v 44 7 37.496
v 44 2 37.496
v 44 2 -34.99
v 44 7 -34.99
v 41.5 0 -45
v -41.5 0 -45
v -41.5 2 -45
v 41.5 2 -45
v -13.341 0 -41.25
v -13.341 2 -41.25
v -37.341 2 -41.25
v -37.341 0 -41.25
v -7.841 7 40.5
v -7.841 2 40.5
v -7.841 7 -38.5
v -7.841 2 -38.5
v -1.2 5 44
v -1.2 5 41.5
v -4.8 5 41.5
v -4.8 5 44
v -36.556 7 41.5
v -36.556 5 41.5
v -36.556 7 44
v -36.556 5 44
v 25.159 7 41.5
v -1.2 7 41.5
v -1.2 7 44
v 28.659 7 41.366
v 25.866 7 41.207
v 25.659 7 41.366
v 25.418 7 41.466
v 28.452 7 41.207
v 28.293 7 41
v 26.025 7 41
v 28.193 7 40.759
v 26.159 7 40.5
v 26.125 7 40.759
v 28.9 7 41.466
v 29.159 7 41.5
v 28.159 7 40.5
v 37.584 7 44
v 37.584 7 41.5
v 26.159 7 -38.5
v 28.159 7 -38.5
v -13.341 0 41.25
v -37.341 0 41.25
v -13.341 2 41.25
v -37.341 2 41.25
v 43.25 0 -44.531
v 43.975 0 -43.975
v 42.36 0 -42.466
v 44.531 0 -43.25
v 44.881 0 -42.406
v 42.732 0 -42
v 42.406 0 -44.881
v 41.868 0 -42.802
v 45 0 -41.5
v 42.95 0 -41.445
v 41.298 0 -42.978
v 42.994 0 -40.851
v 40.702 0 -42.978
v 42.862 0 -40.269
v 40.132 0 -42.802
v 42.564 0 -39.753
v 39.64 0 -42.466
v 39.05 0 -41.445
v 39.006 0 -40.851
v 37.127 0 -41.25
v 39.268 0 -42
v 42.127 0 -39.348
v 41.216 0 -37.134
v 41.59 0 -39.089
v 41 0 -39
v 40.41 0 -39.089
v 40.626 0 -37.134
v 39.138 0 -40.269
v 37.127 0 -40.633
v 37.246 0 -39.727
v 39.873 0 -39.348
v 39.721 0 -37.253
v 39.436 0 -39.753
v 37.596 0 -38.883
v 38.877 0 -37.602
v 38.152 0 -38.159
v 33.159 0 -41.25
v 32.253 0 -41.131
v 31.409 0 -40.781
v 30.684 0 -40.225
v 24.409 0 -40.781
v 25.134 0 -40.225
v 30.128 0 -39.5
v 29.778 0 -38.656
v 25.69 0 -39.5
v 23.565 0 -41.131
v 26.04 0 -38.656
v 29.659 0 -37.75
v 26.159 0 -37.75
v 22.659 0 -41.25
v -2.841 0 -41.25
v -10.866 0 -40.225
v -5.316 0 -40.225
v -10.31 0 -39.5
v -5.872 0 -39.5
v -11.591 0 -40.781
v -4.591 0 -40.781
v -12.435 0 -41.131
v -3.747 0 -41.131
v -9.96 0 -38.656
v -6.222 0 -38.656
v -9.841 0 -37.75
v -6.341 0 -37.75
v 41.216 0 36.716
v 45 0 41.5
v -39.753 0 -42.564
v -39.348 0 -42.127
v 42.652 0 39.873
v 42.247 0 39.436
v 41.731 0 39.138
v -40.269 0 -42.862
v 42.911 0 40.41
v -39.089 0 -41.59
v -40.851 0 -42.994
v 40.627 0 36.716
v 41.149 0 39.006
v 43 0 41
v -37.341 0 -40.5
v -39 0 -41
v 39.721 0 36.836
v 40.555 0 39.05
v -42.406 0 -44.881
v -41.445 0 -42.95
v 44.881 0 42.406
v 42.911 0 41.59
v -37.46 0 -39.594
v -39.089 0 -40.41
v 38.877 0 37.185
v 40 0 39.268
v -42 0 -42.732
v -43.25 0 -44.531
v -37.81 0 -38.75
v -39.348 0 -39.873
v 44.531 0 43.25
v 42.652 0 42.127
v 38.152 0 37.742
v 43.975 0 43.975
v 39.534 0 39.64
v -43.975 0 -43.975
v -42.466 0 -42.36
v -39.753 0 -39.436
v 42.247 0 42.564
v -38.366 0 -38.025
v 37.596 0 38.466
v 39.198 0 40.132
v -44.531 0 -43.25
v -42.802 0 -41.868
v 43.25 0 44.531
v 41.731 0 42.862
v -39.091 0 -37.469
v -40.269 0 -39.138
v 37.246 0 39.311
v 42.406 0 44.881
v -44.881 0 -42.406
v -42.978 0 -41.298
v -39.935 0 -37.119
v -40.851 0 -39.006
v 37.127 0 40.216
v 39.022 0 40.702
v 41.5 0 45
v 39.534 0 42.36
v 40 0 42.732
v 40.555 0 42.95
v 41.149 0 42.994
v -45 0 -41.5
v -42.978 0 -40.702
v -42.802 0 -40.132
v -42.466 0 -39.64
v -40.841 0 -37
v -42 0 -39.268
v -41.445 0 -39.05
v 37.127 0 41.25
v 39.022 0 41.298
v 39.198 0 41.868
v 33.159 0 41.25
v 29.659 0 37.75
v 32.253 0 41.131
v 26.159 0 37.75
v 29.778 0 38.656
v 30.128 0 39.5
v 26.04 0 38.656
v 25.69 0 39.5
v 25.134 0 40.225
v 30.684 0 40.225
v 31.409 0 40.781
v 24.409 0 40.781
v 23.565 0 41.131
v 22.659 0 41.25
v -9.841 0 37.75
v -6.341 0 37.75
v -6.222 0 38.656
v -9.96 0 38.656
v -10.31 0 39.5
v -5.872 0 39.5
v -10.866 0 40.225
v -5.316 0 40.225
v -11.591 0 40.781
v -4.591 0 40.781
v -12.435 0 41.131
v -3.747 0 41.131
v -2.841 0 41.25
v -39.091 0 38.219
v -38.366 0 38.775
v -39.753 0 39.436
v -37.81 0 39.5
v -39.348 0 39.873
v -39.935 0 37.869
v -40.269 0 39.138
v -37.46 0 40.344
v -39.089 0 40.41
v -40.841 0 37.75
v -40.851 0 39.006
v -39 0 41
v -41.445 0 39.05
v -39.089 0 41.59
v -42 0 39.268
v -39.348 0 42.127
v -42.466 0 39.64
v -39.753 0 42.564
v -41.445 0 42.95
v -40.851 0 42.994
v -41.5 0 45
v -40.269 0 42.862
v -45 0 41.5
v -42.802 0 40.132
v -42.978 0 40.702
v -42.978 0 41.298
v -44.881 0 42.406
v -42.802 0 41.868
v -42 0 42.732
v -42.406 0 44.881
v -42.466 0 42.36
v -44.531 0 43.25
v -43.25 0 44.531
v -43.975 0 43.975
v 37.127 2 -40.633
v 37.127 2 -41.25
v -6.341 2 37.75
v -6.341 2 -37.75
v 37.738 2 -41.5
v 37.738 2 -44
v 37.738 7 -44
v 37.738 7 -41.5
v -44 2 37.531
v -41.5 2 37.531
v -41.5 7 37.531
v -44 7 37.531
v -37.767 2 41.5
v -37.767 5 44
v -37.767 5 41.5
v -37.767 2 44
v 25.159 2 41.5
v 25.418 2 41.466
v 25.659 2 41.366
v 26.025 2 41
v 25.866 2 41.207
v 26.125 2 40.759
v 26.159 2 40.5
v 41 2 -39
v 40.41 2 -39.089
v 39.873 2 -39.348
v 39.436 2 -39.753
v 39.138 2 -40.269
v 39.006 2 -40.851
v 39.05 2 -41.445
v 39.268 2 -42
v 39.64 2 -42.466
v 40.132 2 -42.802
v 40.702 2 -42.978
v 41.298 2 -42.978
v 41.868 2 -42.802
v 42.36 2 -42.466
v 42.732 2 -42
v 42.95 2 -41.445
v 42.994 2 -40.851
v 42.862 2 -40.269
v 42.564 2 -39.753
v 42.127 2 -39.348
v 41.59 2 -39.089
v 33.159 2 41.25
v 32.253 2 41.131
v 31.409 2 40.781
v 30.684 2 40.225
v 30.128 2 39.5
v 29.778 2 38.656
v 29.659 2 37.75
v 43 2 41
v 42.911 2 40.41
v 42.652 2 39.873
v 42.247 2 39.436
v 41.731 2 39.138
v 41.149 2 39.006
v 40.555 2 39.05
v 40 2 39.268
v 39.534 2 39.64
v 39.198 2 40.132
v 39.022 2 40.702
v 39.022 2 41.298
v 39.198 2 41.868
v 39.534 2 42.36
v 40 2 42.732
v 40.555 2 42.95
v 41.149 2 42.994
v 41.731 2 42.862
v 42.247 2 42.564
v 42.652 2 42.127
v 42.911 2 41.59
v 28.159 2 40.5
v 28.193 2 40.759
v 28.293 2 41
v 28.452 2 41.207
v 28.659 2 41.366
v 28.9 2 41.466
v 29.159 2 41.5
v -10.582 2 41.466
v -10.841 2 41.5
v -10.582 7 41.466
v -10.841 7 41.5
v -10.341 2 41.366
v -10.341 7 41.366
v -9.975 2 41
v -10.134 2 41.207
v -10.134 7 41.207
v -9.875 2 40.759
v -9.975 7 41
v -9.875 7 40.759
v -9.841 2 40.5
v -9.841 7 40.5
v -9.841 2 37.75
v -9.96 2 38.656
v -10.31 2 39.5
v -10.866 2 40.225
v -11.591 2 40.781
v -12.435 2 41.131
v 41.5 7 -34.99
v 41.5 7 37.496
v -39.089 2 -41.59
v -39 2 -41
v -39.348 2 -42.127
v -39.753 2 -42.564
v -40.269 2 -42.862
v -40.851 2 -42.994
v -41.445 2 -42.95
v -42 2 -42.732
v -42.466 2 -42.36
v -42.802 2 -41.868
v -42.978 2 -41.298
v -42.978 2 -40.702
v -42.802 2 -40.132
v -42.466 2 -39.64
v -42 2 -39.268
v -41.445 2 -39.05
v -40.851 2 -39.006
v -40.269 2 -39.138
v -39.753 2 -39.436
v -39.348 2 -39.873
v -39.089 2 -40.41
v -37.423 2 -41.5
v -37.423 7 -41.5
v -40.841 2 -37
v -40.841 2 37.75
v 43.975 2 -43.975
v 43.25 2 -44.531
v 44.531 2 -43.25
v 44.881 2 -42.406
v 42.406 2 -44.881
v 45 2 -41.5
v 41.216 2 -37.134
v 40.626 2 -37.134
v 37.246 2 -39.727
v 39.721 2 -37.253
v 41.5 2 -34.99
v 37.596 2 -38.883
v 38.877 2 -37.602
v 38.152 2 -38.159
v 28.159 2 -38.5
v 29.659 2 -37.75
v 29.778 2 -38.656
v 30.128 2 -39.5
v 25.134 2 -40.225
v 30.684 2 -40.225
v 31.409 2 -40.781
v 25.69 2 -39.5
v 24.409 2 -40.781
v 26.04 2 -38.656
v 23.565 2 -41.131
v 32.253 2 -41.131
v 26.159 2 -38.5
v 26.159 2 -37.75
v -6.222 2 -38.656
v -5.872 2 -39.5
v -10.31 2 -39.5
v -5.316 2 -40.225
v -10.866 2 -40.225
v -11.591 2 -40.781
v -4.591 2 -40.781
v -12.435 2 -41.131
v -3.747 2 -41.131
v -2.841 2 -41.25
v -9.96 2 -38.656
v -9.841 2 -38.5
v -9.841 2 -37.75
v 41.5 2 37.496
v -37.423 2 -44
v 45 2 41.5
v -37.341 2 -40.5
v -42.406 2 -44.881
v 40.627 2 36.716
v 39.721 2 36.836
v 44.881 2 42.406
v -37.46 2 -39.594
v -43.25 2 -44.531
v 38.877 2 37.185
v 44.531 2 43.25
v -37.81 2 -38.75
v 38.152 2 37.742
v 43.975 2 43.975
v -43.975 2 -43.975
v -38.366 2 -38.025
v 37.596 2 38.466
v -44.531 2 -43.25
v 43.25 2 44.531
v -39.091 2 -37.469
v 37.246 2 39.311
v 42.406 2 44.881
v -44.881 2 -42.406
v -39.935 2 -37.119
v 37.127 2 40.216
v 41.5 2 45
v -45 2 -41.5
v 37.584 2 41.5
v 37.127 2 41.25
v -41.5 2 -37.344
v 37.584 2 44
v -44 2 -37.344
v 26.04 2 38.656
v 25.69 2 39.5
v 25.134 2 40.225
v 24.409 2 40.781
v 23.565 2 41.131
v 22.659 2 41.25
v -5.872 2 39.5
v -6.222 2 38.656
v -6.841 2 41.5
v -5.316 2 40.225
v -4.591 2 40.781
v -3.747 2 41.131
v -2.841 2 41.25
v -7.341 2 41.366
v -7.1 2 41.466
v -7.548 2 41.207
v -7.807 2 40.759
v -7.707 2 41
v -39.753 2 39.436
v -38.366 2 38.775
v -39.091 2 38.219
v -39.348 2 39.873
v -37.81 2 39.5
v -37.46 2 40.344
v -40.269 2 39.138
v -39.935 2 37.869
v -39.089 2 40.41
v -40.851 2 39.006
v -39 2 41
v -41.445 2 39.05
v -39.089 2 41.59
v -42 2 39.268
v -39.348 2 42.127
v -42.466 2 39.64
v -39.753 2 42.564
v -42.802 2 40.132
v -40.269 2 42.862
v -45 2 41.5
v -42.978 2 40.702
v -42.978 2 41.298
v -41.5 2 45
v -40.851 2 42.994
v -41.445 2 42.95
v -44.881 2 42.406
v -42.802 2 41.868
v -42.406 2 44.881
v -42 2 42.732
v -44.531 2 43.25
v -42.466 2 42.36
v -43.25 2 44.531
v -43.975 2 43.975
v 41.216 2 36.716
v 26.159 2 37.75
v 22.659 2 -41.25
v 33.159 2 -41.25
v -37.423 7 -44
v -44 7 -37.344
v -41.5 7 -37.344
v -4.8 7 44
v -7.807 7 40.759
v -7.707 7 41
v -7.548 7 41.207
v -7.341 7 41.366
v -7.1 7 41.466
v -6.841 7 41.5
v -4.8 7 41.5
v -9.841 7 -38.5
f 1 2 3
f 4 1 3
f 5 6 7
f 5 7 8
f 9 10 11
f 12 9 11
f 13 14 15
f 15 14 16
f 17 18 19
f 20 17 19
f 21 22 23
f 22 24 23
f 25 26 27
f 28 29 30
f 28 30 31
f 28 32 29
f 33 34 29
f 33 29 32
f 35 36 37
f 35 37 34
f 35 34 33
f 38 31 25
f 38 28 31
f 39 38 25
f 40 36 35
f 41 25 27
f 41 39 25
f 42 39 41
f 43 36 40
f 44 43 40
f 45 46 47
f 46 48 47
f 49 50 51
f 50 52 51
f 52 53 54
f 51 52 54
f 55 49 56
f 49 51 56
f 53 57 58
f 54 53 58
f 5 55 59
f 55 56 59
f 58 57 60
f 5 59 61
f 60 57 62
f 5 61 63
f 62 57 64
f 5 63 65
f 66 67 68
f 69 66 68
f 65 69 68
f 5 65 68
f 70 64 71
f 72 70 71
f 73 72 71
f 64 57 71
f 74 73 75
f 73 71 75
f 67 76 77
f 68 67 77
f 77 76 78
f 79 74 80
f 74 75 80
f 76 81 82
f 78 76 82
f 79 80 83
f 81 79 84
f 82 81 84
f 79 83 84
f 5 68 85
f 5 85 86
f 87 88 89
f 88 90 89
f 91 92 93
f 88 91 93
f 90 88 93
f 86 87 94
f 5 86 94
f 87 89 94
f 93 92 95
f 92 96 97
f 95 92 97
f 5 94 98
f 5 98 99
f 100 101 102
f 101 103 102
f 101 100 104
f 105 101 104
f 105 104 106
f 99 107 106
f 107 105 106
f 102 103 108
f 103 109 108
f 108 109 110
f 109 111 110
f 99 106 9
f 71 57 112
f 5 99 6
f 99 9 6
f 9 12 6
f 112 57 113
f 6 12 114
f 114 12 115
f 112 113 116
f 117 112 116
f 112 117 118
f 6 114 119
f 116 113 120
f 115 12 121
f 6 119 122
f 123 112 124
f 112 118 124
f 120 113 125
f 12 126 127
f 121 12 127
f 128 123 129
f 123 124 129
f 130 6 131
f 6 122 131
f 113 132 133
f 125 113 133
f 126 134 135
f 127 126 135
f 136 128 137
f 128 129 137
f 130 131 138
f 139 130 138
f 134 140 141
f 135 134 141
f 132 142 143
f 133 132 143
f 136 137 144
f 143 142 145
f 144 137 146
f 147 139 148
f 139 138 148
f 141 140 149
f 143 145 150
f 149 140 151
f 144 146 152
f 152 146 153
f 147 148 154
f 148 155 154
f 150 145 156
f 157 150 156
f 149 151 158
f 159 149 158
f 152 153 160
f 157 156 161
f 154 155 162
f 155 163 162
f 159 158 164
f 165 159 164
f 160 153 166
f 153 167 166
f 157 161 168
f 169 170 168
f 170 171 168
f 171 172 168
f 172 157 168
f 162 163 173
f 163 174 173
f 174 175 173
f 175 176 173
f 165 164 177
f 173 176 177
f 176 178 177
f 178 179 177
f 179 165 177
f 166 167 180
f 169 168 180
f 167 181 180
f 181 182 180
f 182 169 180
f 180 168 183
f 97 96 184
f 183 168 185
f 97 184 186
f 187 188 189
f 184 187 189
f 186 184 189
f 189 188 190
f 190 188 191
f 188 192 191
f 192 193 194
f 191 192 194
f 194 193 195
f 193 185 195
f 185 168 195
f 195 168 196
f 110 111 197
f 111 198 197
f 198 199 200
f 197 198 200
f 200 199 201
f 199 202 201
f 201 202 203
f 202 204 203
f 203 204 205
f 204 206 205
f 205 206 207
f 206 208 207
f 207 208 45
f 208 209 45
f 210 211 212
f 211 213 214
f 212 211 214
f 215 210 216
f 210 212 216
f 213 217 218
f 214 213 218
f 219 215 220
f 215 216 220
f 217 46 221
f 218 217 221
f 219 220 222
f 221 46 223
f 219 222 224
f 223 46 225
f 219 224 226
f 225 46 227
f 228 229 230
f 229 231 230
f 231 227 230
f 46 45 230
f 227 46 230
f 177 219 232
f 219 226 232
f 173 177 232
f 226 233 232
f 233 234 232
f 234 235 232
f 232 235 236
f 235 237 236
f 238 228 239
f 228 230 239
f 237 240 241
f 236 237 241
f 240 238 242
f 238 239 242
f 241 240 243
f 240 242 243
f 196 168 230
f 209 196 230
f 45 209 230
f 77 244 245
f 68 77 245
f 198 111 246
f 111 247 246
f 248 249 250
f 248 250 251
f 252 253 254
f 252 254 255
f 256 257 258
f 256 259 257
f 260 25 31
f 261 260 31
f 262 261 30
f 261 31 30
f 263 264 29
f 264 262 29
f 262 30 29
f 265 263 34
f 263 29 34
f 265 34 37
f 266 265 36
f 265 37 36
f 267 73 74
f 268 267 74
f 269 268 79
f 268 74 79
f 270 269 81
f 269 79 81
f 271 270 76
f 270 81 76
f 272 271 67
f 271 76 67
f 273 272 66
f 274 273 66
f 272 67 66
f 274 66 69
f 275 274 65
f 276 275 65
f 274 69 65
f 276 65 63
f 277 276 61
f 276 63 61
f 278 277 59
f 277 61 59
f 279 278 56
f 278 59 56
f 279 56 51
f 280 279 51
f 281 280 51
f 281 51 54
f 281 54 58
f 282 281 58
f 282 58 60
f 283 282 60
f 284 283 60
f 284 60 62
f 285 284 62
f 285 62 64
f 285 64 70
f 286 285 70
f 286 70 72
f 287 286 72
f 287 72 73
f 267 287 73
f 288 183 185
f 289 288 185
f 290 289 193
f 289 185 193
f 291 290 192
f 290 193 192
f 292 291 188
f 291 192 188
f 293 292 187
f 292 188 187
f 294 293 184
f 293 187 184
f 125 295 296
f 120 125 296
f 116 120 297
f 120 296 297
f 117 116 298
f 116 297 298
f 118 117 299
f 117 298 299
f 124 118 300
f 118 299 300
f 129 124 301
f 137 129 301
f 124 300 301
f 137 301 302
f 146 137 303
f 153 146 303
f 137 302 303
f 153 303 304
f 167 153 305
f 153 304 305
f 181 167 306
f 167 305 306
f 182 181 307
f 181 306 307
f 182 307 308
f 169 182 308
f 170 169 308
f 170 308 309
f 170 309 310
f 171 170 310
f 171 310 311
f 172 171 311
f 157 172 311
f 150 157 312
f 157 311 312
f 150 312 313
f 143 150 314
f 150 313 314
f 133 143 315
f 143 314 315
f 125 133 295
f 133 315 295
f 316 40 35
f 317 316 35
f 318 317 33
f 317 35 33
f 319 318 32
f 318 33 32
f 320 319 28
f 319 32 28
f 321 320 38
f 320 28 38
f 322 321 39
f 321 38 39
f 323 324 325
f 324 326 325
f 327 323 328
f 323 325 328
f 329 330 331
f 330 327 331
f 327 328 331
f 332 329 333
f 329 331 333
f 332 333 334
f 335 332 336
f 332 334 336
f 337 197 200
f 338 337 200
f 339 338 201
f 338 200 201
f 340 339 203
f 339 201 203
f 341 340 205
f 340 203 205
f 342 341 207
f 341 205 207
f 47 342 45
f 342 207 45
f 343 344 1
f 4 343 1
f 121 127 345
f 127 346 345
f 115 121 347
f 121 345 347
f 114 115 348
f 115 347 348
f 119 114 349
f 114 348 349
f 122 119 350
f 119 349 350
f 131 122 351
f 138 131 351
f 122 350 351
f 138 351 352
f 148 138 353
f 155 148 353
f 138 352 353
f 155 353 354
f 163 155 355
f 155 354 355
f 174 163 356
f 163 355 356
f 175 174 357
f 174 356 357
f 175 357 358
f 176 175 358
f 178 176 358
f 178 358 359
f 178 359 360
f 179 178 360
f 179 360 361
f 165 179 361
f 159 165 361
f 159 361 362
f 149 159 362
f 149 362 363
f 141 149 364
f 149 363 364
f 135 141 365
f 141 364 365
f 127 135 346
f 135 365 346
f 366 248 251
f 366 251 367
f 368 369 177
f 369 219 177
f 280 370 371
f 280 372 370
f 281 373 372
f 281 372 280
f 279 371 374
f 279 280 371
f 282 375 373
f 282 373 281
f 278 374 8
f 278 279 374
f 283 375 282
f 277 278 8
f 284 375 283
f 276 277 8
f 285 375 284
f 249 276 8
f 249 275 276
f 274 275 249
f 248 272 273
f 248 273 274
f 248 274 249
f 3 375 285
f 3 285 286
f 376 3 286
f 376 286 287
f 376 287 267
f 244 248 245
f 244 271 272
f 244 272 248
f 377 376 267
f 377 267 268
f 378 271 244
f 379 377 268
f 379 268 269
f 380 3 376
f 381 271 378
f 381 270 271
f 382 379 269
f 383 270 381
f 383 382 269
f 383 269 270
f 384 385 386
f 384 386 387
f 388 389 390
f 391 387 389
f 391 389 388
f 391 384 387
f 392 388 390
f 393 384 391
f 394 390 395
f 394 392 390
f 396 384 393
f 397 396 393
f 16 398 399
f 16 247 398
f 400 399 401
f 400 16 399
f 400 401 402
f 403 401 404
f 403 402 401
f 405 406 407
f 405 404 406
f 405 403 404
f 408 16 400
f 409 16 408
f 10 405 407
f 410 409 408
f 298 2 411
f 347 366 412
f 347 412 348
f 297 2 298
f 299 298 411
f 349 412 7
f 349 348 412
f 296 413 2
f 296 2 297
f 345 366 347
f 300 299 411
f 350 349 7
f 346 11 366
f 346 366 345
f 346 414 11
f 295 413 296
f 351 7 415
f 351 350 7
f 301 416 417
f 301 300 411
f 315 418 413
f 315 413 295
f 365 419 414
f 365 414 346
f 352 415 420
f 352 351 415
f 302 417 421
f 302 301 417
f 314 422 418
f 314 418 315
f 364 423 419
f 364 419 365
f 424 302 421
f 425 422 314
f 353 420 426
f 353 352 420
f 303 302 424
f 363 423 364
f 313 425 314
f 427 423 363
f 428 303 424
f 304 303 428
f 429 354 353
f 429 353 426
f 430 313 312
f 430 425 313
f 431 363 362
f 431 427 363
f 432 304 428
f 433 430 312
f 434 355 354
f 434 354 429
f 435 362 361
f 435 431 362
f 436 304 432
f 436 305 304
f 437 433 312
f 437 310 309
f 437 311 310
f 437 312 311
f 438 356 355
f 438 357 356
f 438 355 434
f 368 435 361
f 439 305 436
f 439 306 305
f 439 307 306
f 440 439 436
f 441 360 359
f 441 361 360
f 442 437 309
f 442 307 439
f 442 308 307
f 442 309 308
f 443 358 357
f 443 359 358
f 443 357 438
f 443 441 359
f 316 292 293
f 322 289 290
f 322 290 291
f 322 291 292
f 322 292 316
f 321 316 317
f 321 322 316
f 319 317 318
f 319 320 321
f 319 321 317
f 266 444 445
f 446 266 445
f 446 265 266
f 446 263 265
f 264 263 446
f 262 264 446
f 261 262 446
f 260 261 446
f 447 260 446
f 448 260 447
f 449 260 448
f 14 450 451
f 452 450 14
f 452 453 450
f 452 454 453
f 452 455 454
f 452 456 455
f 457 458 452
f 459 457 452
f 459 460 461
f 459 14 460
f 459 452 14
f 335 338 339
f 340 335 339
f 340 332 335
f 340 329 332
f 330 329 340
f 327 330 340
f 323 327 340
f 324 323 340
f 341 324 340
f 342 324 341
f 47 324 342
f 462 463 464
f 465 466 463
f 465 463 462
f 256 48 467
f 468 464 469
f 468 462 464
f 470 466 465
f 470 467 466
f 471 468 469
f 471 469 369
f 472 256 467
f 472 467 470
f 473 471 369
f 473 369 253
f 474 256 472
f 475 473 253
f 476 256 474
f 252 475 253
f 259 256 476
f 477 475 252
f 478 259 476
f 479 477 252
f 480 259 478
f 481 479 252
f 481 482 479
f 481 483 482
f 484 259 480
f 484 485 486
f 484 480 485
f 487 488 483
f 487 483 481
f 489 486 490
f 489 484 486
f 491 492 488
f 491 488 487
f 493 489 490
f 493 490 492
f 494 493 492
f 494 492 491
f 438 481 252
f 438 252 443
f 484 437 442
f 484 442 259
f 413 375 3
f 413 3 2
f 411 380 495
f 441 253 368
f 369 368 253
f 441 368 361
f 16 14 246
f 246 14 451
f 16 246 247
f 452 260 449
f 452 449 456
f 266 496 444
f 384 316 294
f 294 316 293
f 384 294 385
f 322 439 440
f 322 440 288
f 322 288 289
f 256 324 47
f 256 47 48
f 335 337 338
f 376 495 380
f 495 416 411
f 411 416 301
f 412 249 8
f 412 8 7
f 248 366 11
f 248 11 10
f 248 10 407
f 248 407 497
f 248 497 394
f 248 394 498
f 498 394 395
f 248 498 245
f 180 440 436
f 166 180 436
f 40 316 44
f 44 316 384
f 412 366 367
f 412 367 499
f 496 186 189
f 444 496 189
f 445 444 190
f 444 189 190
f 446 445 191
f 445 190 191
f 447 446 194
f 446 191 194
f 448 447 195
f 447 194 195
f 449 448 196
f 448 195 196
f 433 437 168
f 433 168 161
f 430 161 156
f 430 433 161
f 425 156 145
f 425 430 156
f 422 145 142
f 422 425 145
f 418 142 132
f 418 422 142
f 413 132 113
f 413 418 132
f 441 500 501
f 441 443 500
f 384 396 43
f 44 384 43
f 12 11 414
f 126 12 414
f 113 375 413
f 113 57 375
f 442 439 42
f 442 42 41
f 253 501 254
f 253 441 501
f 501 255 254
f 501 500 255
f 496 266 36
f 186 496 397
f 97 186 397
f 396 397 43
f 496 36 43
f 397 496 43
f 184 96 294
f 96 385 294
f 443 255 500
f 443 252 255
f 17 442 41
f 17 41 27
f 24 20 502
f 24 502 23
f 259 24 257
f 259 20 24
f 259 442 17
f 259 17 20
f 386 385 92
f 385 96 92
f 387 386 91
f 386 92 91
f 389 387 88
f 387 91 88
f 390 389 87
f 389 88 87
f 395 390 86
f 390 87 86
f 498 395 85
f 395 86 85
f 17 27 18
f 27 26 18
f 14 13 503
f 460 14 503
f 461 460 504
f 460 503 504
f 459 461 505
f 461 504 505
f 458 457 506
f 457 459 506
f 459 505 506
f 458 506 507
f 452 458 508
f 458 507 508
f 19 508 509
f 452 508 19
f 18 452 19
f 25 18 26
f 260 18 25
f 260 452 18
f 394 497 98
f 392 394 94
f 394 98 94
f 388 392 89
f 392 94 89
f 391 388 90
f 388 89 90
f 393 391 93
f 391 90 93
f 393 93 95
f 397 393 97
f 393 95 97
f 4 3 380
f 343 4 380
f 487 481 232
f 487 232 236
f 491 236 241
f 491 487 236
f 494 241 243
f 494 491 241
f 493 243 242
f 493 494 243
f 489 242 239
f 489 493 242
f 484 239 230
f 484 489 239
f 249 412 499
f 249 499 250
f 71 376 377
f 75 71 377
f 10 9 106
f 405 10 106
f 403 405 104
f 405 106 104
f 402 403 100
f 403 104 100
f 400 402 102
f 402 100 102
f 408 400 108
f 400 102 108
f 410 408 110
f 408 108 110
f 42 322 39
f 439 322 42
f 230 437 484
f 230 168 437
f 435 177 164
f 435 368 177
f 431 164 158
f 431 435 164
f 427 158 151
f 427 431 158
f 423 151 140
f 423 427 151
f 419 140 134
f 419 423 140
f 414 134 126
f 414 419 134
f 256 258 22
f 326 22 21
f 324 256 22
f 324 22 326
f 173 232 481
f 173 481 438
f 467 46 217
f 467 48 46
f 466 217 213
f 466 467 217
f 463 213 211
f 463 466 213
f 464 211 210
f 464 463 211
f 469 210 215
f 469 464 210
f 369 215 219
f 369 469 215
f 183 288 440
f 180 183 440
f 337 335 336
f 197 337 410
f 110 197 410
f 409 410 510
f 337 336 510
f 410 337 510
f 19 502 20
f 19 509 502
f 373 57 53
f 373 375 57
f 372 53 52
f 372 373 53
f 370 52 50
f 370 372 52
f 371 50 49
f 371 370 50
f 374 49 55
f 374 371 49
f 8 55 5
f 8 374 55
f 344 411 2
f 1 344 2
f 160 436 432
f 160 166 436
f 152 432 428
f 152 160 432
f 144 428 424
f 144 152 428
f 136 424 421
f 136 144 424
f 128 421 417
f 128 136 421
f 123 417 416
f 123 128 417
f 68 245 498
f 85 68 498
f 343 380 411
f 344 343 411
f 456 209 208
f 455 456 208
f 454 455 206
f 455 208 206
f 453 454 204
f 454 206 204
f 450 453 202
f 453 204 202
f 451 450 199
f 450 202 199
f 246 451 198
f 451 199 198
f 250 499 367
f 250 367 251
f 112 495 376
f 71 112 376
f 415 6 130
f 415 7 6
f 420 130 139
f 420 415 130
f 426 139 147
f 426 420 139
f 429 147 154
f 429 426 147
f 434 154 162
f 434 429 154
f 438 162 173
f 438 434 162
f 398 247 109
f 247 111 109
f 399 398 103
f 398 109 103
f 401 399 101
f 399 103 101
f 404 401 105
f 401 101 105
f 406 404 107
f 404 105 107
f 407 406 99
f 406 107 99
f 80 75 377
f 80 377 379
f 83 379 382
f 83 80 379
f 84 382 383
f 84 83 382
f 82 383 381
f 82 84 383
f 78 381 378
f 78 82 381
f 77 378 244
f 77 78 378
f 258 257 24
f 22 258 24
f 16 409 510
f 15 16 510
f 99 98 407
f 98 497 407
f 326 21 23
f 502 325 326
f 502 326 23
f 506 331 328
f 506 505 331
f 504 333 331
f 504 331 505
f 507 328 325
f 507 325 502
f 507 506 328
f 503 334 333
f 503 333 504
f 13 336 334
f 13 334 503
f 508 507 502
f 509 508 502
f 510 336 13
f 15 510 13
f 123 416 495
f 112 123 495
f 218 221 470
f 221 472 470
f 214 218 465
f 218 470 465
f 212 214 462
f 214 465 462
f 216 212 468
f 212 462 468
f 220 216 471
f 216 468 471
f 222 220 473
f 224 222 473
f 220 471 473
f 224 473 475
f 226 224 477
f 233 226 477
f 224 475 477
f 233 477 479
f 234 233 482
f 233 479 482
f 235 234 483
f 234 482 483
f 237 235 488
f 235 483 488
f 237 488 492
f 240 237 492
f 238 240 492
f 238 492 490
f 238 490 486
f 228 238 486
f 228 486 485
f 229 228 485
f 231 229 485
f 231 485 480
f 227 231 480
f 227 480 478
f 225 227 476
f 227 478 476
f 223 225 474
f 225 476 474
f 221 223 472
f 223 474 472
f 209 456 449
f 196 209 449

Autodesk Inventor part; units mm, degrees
ref_plane "YZ Plane" through (0, 0, 0) normal (1, 0, 0) x (0, 1, 0)
ref_plane "XZ Plane" through (0, 0, 0) normal (0, 1, 0) x (-1, 0, 0)
ref_plane "XY Plane" through (0, 0, 0) normal (0, 0, 1) x (1, 0, 0)
sketch "Sketch1" plane through (0, 0, 0) normal (0, 1, 0) x (-1, 0, 0)
  line L0 (45, -45) -> (-45, -45)
  line L1 (-45, -45) -> (-45, 45)
  line L2 (-45, 45) -> (45, 45)
  line L3 (45, 45) -> (45, -45)
  line L4 (45, -45) -> (-45, 45) construction
  line L5 (-45, -45) -> (45, 45) construction
  point P0 (0, 0)
  dimension "d2" = 90
  dimension "d3" = 90
extrude "Extrusion1" add sketch "Sketch1" along normal blind 2
sketch "Sketch2" plane through (0, 2, 0) normal (0, 1, 0) x (1, 0, 0)
  line L0 (45, -45) -> (45, 45) projected
  line L1 (45, 45) -> (41, 45)
  line L2 (45, 45) -> (-45, 45) projected
  circle A0 centre (41, 41) radius 2
  point P0 (0, 0)
hole "Hole1" at (41, 2, -41) direction (0, -1, 0) diameter 4 end through all
sketch "Sketch3" plane through (0, 2, 0) normal (0, 1, 0) x (1, 0, 0)
  circle A0 centre (-41, 41) radius 2
  line L0 (-45, 45) -> (-45, -45) projected
  circle A1 centre (-41, -41) radius 2
  line L1 (45, -45) -> (45, 45) projected
  circle A2 centre (41, -41) radius 2
  point P0 (0, 0)
  dimension "d17" = 4
  dimension "d21" = 4
extrude "Extrusion2" cut sketch "Sketch3" against normal blind 2
fillet "Fillet1" radius 3.5 4 edges at (-45, 1, -45) (45, 1, -45) (45, 1, 45) (-45, 1, 45)
sketch "Sketch5" plane through (0, 2, 0) normal (0, 1, 0) x (1, 0, 0)
  line L0 (40, 40) -> (-40, 40)
  line L1 (-40, 40) -> (-40, -40)
  line L2 (-40, -40) -> (40, -40)
  line L3 (40, -40) -> (40, 40)
  line L4 (40, 40) -> (-40, -40) construction
  line L5 (-40, 40) -> (40, -40) construction
  line L6 (-9.8412, 41.25) -> (-37.3412, 41.25)
  line L7 (-37.3412, 41.25) -> (-37.3412, -41.25)
  line L8 (-37.3412, -41.25) -> (-9.8412, -41.25)
  line L9 (-9.8412, -41.25) -> (-9.8412, 41.25)
  line L10 (-9.8412, 41.25) -> (-37.3412, -41.25) construction
  line L11 (-37.3412, 41.25) -> (-9.8412, -41.25) construction
  line L12 (26.1588, 41.25) -> (-6.3412, 41.25)
  line L13 (-6.3412, 41.25) -> (-6.3412, -41.25)
  line L14 (-6.3412, -41.25) -> (26.1588, -41.25)
  line L15 (26.1588, -41.25) -> (26.1588, 41.25)
  line L16 (26.1588, 41.25) -> (-6.3412, -41.25) construction
  line L17 (-6.3412, 41.25) -> (26.1588, -41.25) construction
  line L18 (37.1268, 41.25) -> (29.6588, 41.25)
  line L19 (29.6588, 41.25) -> (29.6588, -41.25)
  line L20 (29.6588, -41.25) -> (37.1268, -41.25)
  line L21 (37.1268, -41.25) -> (37.1268, 41.25)
  line L22 (37.1268, 41.25) -> (29.6588, -41.25) construction
  line L23 (29.6588, 41.25) -> (37.1268, -41.25) construction
  line L24 (-41.5049, 41.25) -> (-37.5049, 41.25)
  line L25 (41.2164, 37.1336) -> (36.7164, 37.1336)
  line L26 (36.7164, 37.1336) -> (36.7164, -36.7164)
  line L27 (36.7164, -36.7164) -> (41.2164, -36.7164)
  line L28 (41.2164, -36.7164) -> (41.2164, 37.1336)
  line L29 (41.2164, 37.1336) -> (36.7164, -36.7164) construction
  line L30 (36.7164, 37.1336) -> (41.2164, -36.7164) construction
  line L31 (37.1268, 41.25) -> (41.1268, 41.25)
  line L32 (41.1268, 41.25) -> (41.1268, 37.25)
  point P0 (0, 0)
  point P1 (-23.5912, 0)
  point P2 (9.9088, 0)
  point P3 (33.3928, 0)
  point P4 (38.9664, 0.2086)
  point P5 (37.1268, 37.1336)
  point P6 (37.1268, 40)
  point P7 (29.6588, 40)
  point P8 (29.6588, -40)
  point P9 (37.1268, -40)
  point P10 (37.1268, -36.7164)
  dimension "d25" = 80
  dimension "d26" = 80
  dimension "d27" = 27.5
  dimension "d28" = 82.5
  dimension "d29" = 32.5
  dimension "d30" = 82.5
  dimension "d31" = 7.468
  dimension "d32" = 82.5
  dimension "d33" = 4
  dimension "d34" = 3.5
  dimension "d35" = 3.5
  dimension "d36" = 4.5
  dimension "d37" = 4
  dimension "d38" = 4
  dimension "d39" = 73.85
extrude "Extrusion4" cut sketch "Sketch5" against normal through all contours L21 L25 L26 L27 L2 L19 L0 | L0 L19 L18 L21 | L25 L28 L27 L3 | L3 L27 L21 L25 | L21 L27 L26 L25 | L15 L2 L13 L0 | L0 L13 L12 L15 | L2 L21 L20 L19 | L15 L14 L13 L2 | L9 L2 L7 L0 | L0 L7 L6 L9 | L9 L8 L7 L2
sketch "Sketch8" plane through (0, 2, 0) normal (0, 1, 0) x (1, 0, 0)
  line L0 (-45, 41.5) -> (-45, -41.5) projected
  line L1 (-45, 41.5) -> (-44, 41.5)
  line L2 (41.5, 45) -> (-41.5, 45) projected
  line L3 (-41.5, 45) -> (-41.5, 44)
  line L4 (-45, -41.5) -> (-44, -41.5)
  arc A0 (-45, -41.5) -> (-41.5, -45) centre (-41.5, -41.5) ccw projected
  line L5 (-41.5, -45) -> (-41.5, -44)
  line L6 (41.5, -45) -> (41.5, -44)
  arc A1 (41.5, -45) -> (45, -41.5) centre (41.5, -41.5) ccw projected
  line L7 (45, -41.5) -> (44, -41.5)
  arc A2 (45, 41.5) -> (41.5, 45) centre (41.5, 41.5) ccw projected
  circle A3 centre (-41, -41) radius 2 projected
  line L8 (-41, -39) -> (-41, -38)
  line L9 (-39, -41) -> (-38, -41)
  circle A4 centre (-41, 41) radius 2 projected
  line L10 (-39, 41) -> (-38, 41)
  line L11 (-41, 39) -> (-41, 38)
  circle A5 centre (41, 41) radius 2 projected
  line L12 (37.1268, 41.25) -> (37.1268, 37.1336) projected
  circle A6 centre (41, -41) radius 2 projected
  line L13 (41, -39) -> (41, -38)
  line L14 (39, -41) -> (38, -41)
  line L15 (-44, 37.3438) -> (-41.5, 37.3438)
  line L16 (-41.5, 37.3438) -> (-41.5, -37.5309)
  line L17 (-41.5, -37.5309) -> (-44, -37.5309)
  line L18 (-44, -37.5309) -> (-44, 37.3438)
  line L19 (37.5845, -44) -> (-37.7671, -44)
  line L20 (-37.7671, -44) -> (-37.7671, -41.5)
  line L21 (-37.7671, -41.5) -> (37.5845, -41.5)
  line L22 (37.5845, -41.5) -> (37.5845, -44)
  line L23 (44, 34.9904) -> (41.5, 34.9904)
  line L24 (41.5, 34.9904) -> (41.5, -37.4955)
  line L25 (41.5, -37.4955) -> (44, -37.4955)
  line L26 (44, -37.4955) -> (44, 34.9904)
  line L27 (-37.4232, 44) -> (37.7379, 44)
  line L28 (37.7379, 44) -> (37.7379, 41.5)
  line L29 (37.7379, 41.5) -> (-37.4232, 41.5)
  line L30 (-37.4232, 41.5) -> (-37.4232, 44)
  line L31 (26.1588, -41.5) -> (28.1588, -41.5)
  line L32 (28.1588, -41.5) -> (28.1588, 41.5)
  line L33 (28.1588, 41.5) -> (26.1588, 41.5)
  line L34 (26.1588, 41.5) -> (26.1588, -41.5)
  line L35 (-9.8412, -41.5) -> (-7.8412, -41.5)
  line L36 (-7.8412, -41.5) -> (-7.8412, 41.5)
  line L37 (-7.8412, 41.5) -> (-9.8412, 41.5)
  line L38 (-9.8412, 41.5) -> (-9.8412, -41.5)
  point P0 (0, 0)
  dimension "d46" = 1
  dimension "d47" = 1
  dimension "d48" = 1
  dimension "d49" = 1
  dimension "d50" = 1
  dimension "d51" = 1
  dimension "d54" = 1
  dimension "d55" = 1
  dimension "d56" = 1
  dimension "d57" = 1
  dimension "d60" = 1
  dimension "d61" = 1
  dimension "d63" = 2.5
  dimension "d64" = 2.5
  dimension "d65" = 2.5
  dimension "d72" = 2
  dimension "d73" = 2
extrude "Extrusion5" add sketch "Sketch8" along normal blind 5 contours L15 L16 L17 L18 | L19 L20 L21 L22 | L21 L34 L29 L32 | L38 L29 L36 L21 | L29 L30 L27 L28 | L26 L25 L24 L23
fillet "Fillet3" radius 3.5 1 edges at (37.1268, 1, 36.7164)
fillet "Fillet4" radius 3.5 8 edges at (-6.3412, 1, 41.25) (-6.3412, 1, -41.25) (29.6588, 1, -41.25) (29.6588, 1, 41.25) (26.1588, 1, -41.25) (-9.8412, 1, -41.25) (26.1588, 1, 41.25) (-9.8412, 1, 41.25)
fillet "Fillet7" radius 1 4 edges at (-7.8412, 4.5, 41.5) (28.1588, 4.5, 41.5) (26.1588, 4.5, 41.5) (-9.8412, 4.5, 41.5)
sketch "Sketch10" plane through (0, 0, 0) normal (0, -1, 0) x (1, 0, 0)
  line L0 (-37.3412, -41.25) -> (-37.3412, 41.25) projected
  line L1 (-37.3412, 37.75) -> (-40.8412, 37.75)
  line L2 (-40.8412, 37.75) -> (-40.8412, -37)
  line L3 (-40.8412, -37) -> (-37.3412, -37)
  line L4 (-37.3412, -37) -> (-37.3412, 37.75)
  point P0 (0, 0)
  point P1 (-37.3412, -37.75)
  dimension "d78" = 3.5
extrude "Extrusion6" cut sketch "Sketch10" against normal through all
fillet "Fillet8" radius 3.5 1 edges at (-37.3412, 1, -37)
fillet "Fillet11" radius 3.5 2 edges at (37.1268, 1, -37.1336) (-37.3412, 1, 37.75)
sketch "Sketch19" plane through (-37.7671, 2, 44) normal (0, 0, 1) x (1, 0, 0)
  line L0 (75.3516, 0) -> (0, 0) projected
  line L1 (0, 5) -> (75.3516, 5) projected
  line L2 (0, 0) -> (0, 5) projected
  line L3 (0, 5) -> (0, 3)
  line L4 (0, 3) -> (1.2108, 3)
  line L5 (1.2108, 3) -> (1.2108, 5)
  line L6 (1.2108, 5) -> (0, 5)
  line L7 (0, 5) -> (0, 3)
  point P0 (37.7671, -2)
  dimension "d90" = 2
  dimension "d106" = 1.2108
extrude "Extrusion7" cut sketch "Sketch19" against normal blind 3
sketch "Sketch21" plane through (25.1588, 2, 41.5) normal (0, 0, -1) x (-1, 0, 0)
  line L0 (32, 0) -> (0, 0) projected
  line L1 (0, 5) -> (32, 5) projected
  line L2 (28.159, 5) -> (29.959, 5)
  line L3 (29.959, 5) -> (29.959, 4)
  line L4 (28.159, 5) -> (26.359, 5)
  line L5 (29.959, 5) -> (26.359, 5)
  line L6 (26.359, 5) -> (26.359, 3)
  line L7 (26.359, 3) -> (29.959, 3)
  line L8 (29.959, 3) -> (29.959, 5)
  point P0 (25.1588, -2)
  point P1 (29.959, 4)
  dimension "d102" = 1.8
  dimension "d103" = 1
  dimension "d104" = 1.8
  dimension "d105" = 2
extrude "Extrusion8" cut sketch "Sketch21" against normal up to surface (2.5 mm away)
sketch "Sketch22" plane through (-9.8412, 2, -41.5) normal (-1, 0, 0) x (0, 0, 1)
  line L0 (0, 5) -> (82, 5) projected
  line L1 (0, 5) -> (3, 5)
  line L2 (3.75, 0) -> (0, 0) projected
  line L3 (3, 5) -> (0, 5)
  line L4 (0, 5) -> (0, 0)
  line L5 (0, 0) -> (3, 0)
  line L6 (3, 0) -> (3, 5)
  point P0 (41.5, -2)
  point P1 (3, 0)
  dimension "d98" = 3
extrude "Extrusion9" cut sketch "Sketch22" against normal up to surface (38 mm away)
sketch "Sketch23" plane through (-37.7671, 2, 44) normal (0, 0, 1) x (1, 0, 0)
  line L0 (33.7518, 5) -> (31.9518, 5)
  line L1 (36.5669, 5) -> (75.3516, 5) projected
  line L2 (31.9518, 5) -> (31.9518, 3.1171)
  point P0 (37.7671, -2)
  point P1 (0.3379, 5)
  dimension "d101" = 1.8
sketch "Sketch24" plane through (-37.7671, 2, 44) normal (0, 0, 1) x (1, 0, 0)
  point P0 (37.7671, -2)
properties part number "LeftCover" material "ABS Plastic"
